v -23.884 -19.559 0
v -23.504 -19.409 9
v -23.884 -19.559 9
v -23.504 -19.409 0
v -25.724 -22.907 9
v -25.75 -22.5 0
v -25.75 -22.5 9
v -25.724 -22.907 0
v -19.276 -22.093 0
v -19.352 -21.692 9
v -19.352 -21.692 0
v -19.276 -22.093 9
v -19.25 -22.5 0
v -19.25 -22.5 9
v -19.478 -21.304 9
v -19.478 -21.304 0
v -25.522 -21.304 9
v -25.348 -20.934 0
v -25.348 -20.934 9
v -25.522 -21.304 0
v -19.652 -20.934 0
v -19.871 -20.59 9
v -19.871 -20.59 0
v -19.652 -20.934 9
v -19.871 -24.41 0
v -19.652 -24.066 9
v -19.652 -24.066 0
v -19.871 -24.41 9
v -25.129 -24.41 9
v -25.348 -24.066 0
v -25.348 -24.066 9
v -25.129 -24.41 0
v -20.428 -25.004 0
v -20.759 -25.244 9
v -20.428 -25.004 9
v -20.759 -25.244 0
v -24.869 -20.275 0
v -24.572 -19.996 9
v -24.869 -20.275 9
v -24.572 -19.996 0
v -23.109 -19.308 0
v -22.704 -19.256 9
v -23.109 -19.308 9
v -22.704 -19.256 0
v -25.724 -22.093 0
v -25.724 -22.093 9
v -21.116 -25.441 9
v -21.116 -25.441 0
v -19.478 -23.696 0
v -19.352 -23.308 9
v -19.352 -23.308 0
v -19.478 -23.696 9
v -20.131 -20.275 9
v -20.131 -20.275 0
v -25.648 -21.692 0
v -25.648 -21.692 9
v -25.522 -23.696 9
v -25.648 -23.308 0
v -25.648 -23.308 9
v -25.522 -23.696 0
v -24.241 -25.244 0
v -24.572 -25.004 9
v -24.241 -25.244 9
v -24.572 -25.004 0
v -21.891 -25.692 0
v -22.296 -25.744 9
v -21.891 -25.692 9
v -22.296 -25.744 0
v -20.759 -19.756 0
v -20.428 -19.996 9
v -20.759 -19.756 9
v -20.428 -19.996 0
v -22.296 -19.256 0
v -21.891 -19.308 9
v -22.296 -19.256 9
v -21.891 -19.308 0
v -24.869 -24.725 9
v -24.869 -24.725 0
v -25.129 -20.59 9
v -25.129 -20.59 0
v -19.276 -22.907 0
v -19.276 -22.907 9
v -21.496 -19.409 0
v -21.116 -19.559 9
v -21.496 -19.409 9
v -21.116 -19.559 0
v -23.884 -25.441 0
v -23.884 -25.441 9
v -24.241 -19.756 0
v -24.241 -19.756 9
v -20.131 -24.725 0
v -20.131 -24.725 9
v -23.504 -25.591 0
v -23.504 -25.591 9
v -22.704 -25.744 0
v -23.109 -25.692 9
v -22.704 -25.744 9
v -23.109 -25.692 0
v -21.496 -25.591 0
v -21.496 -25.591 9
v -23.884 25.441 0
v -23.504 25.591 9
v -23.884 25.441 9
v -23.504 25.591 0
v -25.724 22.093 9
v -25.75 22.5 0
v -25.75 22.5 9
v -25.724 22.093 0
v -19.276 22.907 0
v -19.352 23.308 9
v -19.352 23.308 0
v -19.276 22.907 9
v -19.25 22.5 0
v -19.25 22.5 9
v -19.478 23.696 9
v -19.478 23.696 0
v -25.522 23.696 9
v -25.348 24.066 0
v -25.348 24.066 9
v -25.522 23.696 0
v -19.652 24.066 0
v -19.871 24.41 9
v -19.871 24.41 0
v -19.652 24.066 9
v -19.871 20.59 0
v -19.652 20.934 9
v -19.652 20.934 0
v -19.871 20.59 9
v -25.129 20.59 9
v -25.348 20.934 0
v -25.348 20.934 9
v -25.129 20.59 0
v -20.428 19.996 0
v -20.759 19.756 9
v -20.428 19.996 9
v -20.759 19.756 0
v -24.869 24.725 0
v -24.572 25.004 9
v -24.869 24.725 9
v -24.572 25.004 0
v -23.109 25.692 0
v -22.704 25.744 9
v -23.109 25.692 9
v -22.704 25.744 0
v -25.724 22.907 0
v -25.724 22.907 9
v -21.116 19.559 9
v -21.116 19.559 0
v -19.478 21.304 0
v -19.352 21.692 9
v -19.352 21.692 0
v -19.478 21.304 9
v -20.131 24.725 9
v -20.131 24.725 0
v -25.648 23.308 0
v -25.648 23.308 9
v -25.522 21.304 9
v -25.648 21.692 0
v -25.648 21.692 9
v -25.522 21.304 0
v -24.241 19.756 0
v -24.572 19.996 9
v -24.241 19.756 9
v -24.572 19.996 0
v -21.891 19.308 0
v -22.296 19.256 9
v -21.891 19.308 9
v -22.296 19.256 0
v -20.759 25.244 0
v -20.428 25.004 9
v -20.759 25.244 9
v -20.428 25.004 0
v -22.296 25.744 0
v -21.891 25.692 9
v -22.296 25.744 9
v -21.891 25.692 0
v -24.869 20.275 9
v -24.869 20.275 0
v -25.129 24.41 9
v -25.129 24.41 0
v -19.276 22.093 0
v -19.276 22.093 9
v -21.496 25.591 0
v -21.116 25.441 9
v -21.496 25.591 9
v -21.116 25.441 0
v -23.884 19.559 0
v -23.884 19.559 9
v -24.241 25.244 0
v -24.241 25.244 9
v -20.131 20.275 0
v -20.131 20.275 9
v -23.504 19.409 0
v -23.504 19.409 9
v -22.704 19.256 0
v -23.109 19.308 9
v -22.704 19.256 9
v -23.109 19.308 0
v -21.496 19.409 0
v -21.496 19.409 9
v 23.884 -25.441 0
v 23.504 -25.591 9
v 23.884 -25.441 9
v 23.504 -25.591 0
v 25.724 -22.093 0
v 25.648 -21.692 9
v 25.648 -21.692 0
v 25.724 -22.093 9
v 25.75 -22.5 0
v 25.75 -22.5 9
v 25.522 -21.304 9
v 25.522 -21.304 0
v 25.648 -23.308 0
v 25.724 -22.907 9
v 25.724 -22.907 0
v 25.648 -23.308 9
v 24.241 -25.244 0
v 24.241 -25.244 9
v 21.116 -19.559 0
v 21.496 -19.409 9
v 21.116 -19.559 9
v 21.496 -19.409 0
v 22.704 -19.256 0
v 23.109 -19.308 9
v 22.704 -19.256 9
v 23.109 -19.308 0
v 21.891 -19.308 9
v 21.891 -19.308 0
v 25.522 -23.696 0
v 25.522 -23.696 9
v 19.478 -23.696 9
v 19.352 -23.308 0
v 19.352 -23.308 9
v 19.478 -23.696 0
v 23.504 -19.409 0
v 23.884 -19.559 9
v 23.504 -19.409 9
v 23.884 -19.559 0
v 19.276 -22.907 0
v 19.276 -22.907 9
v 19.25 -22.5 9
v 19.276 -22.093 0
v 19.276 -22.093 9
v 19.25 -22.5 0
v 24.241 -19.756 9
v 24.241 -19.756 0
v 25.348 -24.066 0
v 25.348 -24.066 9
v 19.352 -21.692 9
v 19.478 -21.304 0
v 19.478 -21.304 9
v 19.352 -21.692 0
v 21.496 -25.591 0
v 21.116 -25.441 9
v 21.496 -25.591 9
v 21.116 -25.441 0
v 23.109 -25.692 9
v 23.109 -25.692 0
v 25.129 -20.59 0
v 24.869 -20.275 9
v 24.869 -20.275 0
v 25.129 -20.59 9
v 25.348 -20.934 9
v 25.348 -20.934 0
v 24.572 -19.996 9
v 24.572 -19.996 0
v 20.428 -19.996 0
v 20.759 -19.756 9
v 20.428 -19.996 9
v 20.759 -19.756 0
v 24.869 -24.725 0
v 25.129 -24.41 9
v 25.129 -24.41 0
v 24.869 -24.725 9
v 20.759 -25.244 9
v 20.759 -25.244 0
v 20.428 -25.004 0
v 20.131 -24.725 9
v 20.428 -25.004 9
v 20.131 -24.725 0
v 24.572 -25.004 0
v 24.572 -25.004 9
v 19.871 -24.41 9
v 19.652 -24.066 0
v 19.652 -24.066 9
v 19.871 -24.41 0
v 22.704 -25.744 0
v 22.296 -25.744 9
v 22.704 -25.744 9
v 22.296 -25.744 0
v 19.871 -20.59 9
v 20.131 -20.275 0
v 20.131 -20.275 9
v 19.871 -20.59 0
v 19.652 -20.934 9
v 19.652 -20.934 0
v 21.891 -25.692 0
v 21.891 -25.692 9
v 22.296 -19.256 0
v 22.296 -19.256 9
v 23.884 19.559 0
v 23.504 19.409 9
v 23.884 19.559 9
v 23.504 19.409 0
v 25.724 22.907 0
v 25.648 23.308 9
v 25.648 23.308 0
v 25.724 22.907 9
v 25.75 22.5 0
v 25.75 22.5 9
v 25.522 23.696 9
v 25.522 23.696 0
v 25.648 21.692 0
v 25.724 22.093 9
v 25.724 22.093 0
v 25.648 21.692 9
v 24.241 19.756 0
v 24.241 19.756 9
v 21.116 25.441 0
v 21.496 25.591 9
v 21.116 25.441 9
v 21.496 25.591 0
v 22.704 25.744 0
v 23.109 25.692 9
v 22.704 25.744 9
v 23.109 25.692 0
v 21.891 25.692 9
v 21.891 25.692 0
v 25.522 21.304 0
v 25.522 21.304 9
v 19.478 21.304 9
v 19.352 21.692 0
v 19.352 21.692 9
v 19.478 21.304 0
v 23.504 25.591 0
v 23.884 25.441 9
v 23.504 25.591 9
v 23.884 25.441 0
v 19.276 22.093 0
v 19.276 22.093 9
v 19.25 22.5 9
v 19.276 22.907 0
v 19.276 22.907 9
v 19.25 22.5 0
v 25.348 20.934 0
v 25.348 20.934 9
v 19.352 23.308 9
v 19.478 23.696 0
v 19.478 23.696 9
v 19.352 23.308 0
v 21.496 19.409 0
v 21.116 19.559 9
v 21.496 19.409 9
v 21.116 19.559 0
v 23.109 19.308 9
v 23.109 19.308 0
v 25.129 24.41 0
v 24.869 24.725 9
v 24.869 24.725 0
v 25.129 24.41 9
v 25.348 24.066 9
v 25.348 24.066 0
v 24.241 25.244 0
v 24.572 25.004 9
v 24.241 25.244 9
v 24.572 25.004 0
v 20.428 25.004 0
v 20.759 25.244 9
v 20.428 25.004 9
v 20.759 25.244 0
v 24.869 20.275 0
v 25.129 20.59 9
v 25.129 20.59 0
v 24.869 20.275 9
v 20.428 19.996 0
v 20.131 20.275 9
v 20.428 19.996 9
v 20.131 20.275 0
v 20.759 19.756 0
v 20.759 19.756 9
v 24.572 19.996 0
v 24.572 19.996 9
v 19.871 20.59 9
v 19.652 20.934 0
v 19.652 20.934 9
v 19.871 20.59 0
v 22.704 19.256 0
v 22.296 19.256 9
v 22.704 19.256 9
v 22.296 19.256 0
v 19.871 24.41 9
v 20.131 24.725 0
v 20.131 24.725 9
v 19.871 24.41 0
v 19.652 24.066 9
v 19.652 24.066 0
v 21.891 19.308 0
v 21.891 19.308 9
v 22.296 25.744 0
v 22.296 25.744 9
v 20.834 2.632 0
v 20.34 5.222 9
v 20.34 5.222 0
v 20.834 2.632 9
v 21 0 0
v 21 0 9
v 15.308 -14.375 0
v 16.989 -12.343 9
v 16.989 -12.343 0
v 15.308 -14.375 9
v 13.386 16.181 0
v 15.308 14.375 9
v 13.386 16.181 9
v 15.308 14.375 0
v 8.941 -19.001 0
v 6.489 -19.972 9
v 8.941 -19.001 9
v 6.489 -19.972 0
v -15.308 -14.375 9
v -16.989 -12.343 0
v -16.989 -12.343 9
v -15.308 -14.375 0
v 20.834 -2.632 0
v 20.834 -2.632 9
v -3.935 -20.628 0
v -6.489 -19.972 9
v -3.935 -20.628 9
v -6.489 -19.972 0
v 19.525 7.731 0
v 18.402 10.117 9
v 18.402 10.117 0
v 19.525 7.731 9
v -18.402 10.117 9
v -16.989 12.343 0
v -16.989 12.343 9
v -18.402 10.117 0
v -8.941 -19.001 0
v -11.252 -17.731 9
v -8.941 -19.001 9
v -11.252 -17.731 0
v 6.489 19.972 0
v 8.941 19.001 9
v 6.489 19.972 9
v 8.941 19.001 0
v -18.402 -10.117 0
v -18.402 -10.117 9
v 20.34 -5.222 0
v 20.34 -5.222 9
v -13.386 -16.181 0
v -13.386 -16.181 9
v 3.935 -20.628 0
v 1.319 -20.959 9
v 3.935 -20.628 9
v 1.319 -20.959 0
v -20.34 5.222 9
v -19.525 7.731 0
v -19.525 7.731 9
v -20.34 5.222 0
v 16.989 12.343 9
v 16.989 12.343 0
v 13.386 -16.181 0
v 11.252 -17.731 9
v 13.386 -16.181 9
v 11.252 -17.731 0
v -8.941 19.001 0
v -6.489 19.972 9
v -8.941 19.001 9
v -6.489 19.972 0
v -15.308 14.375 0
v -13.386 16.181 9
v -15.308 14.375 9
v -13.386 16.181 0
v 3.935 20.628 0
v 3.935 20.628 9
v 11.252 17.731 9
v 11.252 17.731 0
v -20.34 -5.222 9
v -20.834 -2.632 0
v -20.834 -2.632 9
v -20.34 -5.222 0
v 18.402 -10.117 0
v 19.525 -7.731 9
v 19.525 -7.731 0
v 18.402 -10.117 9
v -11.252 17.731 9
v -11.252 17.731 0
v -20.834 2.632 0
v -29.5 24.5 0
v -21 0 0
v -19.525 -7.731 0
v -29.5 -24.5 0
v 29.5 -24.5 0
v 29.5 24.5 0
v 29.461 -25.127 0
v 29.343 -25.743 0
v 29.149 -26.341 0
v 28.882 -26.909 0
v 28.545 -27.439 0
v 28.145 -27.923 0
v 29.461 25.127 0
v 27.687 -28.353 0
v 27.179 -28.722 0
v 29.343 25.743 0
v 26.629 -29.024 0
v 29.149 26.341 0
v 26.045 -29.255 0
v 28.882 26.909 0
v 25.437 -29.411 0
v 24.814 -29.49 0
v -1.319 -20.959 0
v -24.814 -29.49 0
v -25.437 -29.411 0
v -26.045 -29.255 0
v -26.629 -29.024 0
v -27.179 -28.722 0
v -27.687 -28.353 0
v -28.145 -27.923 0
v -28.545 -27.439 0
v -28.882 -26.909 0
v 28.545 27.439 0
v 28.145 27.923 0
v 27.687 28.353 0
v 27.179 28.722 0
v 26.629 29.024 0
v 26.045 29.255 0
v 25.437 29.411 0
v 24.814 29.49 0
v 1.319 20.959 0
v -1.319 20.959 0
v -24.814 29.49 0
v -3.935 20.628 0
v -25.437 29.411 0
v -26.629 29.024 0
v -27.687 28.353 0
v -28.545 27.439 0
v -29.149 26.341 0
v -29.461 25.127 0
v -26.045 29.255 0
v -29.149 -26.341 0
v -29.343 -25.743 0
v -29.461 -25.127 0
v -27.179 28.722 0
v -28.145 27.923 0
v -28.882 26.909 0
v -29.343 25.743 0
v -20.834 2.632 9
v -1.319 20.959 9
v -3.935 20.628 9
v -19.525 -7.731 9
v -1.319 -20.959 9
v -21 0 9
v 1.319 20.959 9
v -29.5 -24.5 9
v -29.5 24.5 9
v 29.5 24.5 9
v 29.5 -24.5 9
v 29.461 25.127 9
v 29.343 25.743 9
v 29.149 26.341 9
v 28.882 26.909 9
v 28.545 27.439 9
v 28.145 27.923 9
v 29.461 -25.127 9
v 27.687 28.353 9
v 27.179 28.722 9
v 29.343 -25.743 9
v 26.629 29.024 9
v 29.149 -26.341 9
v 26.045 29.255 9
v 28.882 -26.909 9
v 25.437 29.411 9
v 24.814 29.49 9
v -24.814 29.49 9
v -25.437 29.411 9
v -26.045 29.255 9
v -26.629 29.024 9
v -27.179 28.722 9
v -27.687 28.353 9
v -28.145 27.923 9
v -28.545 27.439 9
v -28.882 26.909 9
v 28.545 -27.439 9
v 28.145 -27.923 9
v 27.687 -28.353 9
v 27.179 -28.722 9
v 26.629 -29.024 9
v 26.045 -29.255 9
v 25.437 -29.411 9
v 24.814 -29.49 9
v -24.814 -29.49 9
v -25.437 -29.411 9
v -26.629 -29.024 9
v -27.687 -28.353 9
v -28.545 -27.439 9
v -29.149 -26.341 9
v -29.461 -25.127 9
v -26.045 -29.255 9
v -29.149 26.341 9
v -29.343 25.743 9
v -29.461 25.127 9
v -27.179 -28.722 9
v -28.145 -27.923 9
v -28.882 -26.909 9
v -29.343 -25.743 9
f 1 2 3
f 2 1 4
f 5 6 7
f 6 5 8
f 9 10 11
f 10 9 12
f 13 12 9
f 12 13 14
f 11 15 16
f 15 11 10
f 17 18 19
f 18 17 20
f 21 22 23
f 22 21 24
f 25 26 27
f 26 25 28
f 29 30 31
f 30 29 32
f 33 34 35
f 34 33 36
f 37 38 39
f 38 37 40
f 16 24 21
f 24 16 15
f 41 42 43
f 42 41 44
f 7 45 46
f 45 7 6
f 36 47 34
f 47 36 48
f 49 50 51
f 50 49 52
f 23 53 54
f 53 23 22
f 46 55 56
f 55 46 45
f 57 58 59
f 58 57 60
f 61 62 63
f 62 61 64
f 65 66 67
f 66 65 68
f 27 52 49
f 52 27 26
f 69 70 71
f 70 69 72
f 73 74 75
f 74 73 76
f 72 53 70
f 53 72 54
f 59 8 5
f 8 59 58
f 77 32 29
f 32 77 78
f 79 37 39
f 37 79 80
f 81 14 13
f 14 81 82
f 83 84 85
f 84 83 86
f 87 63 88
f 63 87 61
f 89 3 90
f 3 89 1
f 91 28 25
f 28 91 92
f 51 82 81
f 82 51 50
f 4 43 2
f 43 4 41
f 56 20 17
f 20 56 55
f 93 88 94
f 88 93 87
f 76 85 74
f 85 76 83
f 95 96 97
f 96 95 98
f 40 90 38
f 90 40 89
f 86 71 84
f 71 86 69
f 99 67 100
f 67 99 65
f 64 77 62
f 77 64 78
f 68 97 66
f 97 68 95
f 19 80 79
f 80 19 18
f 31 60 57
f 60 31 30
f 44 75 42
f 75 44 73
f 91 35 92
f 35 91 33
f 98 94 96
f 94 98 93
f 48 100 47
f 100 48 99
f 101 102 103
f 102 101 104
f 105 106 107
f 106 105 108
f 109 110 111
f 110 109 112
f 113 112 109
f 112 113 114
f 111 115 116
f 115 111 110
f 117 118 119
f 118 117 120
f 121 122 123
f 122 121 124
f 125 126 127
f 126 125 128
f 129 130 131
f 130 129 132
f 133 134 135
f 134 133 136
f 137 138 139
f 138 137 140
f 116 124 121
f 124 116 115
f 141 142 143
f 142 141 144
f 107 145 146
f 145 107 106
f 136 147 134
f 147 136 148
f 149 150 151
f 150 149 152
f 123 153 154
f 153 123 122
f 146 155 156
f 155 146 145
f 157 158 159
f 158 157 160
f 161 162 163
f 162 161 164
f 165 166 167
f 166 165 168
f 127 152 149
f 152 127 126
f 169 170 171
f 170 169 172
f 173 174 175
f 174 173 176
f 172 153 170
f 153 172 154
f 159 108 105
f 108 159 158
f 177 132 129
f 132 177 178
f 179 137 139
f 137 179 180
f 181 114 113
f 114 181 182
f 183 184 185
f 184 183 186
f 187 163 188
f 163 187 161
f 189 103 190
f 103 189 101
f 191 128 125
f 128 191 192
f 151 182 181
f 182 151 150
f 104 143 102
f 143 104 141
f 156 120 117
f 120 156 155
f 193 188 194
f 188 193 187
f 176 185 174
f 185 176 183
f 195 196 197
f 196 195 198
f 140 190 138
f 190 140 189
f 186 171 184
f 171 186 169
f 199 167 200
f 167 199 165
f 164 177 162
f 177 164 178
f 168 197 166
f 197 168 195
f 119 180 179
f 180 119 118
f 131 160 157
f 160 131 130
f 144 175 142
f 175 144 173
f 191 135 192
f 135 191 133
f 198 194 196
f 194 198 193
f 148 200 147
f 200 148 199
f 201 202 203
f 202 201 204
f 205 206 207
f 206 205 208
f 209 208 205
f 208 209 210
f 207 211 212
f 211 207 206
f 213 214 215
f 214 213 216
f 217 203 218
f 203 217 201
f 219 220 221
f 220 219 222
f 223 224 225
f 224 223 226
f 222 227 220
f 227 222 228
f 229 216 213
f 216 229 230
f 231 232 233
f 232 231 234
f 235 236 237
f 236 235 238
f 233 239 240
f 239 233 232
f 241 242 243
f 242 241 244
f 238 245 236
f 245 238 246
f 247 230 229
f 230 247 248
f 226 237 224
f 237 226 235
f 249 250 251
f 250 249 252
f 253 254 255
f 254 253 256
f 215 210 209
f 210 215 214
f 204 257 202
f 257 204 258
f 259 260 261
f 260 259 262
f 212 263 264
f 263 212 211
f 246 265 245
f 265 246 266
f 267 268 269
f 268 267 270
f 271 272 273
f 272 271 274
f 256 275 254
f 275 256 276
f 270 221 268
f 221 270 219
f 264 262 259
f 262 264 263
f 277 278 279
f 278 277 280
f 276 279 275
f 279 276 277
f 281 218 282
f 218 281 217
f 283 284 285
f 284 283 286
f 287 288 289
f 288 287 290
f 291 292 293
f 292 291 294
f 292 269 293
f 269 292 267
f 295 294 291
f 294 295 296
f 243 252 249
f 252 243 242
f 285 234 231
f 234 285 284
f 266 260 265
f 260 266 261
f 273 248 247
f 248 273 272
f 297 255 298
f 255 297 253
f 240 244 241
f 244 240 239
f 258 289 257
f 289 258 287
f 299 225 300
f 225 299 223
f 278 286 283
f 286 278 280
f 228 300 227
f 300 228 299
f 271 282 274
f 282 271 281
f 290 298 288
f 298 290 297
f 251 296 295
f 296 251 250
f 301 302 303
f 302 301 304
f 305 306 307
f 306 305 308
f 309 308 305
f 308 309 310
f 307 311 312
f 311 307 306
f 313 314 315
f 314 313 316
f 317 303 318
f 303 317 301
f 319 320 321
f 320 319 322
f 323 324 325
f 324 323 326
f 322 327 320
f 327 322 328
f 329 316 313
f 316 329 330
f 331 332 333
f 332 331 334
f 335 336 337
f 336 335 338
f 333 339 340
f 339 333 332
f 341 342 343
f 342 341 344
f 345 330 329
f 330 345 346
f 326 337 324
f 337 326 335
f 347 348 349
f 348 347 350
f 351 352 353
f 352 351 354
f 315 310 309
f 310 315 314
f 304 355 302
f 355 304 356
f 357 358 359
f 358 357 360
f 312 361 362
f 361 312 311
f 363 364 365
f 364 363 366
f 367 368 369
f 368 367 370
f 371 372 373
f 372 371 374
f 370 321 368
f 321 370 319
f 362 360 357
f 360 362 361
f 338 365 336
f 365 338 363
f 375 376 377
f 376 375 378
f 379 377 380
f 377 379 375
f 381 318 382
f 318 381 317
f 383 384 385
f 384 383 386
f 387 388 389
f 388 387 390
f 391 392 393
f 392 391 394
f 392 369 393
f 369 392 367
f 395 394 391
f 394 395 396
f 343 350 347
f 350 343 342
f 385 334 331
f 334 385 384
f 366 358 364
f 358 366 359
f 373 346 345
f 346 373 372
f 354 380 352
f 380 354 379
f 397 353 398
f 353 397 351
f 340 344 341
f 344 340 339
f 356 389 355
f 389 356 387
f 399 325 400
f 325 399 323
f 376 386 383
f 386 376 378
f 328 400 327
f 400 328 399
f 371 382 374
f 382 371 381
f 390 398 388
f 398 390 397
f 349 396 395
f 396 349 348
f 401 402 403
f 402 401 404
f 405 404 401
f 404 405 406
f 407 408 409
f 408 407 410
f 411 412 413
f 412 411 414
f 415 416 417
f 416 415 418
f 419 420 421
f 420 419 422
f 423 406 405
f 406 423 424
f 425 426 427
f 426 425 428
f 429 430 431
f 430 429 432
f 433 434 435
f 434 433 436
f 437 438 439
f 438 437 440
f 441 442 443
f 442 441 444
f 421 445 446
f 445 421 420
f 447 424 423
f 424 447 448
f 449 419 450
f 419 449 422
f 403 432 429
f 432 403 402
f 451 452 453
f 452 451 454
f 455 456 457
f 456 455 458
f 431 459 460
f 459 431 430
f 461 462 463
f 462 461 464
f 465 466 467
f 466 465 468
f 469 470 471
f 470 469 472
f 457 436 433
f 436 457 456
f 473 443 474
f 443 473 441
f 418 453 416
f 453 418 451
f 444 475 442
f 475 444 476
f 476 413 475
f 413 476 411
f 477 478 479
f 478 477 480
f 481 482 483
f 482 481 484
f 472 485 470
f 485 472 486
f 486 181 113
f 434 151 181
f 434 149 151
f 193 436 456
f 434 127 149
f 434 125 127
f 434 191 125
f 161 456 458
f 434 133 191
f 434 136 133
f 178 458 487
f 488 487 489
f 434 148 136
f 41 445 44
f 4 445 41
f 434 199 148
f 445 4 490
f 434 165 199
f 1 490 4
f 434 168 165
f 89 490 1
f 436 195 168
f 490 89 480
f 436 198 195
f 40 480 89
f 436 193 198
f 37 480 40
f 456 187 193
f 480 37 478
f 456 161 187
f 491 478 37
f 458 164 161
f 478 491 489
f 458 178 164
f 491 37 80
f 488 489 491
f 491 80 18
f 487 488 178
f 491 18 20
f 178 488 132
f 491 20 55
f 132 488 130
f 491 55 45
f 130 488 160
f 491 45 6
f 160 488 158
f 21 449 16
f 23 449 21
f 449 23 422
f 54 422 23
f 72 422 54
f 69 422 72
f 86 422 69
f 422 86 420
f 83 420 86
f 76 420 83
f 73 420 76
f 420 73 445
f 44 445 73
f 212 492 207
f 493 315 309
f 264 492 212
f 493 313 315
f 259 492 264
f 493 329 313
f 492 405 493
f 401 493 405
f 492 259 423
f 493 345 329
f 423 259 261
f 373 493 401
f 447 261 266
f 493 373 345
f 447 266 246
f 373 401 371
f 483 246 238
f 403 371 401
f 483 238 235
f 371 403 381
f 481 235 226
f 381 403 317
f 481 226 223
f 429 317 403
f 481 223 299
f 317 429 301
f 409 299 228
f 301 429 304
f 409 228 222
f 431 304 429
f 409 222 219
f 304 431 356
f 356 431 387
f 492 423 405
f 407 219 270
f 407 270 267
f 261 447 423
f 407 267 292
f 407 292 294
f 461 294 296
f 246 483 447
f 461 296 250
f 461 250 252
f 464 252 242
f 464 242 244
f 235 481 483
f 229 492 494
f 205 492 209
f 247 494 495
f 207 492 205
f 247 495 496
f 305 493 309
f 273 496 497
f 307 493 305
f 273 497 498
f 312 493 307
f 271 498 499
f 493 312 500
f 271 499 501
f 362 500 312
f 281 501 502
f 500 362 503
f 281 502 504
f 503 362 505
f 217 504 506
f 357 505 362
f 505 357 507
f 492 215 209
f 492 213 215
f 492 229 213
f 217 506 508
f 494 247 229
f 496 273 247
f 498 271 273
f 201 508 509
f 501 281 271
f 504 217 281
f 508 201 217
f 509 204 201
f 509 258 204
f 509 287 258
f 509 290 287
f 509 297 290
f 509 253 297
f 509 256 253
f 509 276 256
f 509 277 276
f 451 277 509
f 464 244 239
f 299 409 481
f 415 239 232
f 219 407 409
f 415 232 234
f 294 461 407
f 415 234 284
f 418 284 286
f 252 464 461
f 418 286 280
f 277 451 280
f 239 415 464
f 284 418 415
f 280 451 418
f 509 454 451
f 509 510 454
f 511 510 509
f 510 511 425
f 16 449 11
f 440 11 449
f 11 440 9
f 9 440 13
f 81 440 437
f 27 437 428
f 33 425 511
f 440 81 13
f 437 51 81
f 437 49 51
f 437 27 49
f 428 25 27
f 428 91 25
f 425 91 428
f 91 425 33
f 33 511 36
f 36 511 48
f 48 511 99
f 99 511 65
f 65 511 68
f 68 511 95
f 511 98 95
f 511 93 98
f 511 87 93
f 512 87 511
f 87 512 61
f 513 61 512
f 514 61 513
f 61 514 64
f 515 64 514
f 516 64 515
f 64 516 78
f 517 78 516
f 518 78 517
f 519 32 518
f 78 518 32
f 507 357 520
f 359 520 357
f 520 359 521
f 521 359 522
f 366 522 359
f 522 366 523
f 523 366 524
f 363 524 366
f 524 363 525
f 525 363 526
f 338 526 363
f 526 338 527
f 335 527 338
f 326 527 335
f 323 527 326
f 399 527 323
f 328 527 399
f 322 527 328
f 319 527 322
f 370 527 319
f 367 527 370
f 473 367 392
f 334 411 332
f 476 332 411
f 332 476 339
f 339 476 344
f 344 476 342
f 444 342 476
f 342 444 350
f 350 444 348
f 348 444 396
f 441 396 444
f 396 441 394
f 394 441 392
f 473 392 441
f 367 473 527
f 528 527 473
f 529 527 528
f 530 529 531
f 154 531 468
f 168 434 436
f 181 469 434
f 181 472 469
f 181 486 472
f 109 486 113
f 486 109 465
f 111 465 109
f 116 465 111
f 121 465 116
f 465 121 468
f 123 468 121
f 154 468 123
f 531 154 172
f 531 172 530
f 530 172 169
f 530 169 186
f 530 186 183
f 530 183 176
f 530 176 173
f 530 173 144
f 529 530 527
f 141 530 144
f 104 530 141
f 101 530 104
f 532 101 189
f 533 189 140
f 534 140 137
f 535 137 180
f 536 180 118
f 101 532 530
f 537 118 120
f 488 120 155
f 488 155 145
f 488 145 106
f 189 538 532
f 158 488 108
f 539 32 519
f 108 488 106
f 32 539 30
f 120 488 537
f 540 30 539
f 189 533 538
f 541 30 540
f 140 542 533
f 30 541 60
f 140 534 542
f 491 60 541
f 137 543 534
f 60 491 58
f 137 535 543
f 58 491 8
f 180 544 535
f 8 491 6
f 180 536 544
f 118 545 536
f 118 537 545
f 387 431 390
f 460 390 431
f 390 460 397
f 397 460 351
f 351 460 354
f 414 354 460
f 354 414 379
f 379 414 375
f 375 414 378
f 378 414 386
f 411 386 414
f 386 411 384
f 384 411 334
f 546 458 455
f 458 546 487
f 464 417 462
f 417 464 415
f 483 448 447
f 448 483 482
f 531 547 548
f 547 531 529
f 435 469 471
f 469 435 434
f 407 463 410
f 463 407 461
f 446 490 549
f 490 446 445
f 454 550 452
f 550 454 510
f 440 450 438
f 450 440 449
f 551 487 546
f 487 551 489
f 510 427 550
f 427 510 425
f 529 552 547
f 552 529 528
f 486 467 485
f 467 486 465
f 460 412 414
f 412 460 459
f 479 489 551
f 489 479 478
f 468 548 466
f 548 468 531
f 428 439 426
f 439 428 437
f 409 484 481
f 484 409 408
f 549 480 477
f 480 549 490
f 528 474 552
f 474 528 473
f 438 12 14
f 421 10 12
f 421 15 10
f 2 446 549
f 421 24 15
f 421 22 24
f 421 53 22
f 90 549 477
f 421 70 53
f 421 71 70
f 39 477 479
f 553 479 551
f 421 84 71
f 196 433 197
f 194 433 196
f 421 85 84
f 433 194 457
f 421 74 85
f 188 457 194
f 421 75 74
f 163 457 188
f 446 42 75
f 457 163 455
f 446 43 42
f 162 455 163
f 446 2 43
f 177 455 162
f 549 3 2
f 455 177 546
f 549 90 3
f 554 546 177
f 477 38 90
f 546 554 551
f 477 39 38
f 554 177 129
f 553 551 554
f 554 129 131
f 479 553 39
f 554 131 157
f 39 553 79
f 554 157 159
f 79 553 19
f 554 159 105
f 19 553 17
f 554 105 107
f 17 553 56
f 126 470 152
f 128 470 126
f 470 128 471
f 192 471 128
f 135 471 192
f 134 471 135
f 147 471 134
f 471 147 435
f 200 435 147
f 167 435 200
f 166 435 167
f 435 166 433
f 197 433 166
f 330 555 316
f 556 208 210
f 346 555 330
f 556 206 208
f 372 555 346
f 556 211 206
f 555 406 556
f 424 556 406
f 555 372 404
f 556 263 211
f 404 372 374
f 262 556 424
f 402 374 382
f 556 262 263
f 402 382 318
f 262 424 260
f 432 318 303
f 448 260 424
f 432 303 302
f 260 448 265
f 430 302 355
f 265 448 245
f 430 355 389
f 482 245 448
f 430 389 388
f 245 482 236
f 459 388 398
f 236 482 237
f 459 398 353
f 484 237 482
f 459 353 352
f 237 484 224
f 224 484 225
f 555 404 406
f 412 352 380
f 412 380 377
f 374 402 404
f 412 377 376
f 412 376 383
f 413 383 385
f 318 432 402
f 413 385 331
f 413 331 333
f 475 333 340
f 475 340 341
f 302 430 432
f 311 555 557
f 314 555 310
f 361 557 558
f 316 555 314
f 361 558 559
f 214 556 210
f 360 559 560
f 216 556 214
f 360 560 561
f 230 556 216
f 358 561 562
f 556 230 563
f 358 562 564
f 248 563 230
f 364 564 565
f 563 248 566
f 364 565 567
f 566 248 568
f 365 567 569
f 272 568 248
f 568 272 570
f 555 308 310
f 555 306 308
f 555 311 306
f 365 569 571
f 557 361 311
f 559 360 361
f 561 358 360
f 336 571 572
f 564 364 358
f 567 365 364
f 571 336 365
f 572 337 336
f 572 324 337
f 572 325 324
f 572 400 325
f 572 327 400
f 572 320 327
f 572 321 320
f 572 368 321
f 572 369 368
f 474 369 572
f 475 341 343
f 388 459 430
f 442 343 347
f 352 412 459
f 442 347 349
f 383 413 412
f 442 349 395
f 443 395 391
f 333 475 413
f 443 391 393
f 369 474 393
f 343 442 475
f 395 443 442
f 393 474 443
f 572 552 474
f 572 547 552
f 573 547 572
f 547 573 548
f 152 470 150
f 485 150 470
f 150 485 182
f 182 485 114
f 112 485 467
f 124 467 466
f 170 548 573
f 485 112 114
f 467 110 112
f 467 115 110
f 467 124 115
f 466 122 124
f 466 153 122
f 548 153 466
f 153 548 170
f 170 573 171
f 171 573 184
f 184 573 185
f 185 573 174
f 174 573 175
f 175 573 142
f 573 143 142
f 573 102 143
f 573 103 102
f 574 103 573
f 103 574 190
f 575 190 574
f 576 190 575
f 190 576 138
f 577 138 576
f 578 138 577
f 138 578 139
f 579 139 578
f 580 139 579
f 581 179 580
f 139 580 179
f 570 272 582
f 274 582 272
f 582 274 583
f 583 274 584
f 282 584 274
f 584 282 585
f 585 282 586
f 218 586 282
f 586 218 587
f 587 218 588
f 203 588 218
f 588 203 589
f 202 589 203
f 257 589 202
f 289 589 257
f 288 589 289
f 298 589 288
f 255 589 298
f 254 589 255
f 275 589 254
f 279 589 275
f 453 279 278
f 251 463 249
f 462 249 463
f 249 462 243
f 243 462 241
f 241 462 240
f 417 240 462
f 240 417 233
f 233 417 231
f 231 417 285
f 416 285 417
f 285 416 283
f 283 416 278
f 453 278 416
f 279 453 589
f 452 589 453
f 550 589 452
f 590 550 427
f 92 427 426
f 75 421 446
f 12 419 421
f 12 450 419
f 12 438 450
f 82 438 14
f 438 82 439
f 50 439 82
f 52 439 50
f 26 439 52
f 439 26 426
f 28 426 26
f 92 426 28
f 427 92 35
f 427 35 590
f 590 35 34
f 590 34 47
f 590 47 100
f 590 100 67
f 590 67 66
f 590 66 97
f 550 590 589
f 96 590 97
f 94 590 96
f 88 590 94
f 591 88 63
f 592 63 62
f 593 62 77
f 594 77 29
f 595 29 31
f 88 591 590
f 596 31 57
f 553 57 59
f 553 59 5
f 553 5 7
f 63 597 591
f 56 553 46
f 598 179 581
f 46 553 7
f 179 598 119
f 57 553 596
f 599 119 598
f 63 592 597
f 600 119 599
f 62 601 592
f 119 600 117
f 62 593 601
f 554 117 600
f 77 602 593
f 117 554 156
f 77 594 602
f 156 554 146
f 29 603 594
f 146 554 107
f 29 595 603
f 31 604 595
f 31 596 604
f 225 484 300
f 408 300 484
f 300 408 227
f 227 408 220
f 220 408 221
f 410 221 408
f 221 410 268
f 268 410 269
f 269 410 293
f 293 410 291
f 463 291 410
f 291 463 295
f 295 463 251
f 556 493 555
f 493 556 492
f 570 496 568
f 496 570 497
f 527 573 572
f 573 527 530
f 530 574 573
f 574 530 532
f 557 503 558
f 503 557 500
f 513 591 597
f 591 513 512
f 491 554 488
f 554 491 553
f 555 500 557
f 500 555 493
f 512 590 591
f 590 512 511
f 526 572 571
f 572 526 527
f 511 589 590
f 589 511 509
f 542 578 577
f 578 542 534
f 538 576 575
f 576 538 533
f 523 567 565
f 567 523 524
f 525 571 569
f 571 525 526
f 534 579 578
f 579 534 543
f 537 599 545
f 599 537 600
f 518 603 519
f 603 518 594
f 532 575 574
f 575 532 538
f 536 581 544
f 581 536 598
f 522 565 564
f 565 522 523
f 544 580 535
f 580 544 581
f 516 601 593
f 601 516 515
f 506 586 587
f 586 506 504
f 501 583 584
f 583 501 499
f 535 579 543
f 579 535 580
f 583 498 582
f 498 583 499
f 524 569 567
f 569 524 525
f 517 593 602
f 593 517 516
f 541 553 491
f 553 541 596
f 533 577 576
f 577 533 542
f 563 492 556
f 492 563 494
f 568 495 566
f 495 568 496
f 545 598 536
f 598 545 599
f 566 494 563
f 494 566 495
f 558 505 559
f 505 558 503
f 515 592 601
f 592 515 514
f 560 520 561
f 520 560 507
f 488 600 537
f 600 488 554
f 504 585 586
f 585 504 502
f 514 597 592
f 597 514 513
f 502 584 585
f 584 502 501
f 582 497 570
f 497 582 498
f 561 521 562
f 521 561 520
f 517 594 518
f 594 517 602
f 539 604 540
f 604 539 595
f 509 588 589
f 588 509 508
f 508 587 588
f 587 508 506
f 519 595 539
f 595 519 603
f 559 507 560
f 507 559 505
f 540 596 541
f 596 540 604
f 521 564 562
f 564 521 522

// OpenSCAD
$fn = 50;

difference() {
	union() {
		hull() {
			translate(v = [-24.5, 24.5, 0]) {
				cylinder(h = 9, r = 5);
			}
			translate(v = [24.5, 24.5, 0]) {
				cylinder(h = 9, r = 5);
			}
			translate(v = [-24.5, -24.5, 0]) {
				cylinder(h = 9, r = 5);
			}
			translate(v = [24.5, -24.5, 0]) {
				cylinder(h = 9, r = 5);
			}
		}
	}
	union() {
		translate(v = [-22.5, -22.5, -100.0]) {
			cylinder(h = 200, r = 3.25);
		}
		translate(v = [-22.5, 22.5, -100.0]) {
			cylinder(h = 200, r = 3.25);
		}
		translate(v = [22.5, -22.5, -100.0]) {
			cylinder(h = 200, r = 3.25);
		}
		translate(v = [22.5, 22.5, -100.0]) {
			cylinder(h = 200, r = 3.25);
		}
		translate(v = [-22.5, -22.5, -100.0]) {
			cylinder(h = 200, r = 1.8);
		}
		translate(v = [-22.5, 22.5, -100.0]) {
			cylinder(h = 200, r = 1.8);
		}
		translate(v = [22.5, -22.5, -100.0]) {
			cylinder(h = 200, r = 1.8);
		}
		translate(v = [22.5, 22.5, -100.0]) {
			cylinder(h = 200, r = 1.8);
		}
		cylinder(h = 9, r = 21.0);
	}
}
